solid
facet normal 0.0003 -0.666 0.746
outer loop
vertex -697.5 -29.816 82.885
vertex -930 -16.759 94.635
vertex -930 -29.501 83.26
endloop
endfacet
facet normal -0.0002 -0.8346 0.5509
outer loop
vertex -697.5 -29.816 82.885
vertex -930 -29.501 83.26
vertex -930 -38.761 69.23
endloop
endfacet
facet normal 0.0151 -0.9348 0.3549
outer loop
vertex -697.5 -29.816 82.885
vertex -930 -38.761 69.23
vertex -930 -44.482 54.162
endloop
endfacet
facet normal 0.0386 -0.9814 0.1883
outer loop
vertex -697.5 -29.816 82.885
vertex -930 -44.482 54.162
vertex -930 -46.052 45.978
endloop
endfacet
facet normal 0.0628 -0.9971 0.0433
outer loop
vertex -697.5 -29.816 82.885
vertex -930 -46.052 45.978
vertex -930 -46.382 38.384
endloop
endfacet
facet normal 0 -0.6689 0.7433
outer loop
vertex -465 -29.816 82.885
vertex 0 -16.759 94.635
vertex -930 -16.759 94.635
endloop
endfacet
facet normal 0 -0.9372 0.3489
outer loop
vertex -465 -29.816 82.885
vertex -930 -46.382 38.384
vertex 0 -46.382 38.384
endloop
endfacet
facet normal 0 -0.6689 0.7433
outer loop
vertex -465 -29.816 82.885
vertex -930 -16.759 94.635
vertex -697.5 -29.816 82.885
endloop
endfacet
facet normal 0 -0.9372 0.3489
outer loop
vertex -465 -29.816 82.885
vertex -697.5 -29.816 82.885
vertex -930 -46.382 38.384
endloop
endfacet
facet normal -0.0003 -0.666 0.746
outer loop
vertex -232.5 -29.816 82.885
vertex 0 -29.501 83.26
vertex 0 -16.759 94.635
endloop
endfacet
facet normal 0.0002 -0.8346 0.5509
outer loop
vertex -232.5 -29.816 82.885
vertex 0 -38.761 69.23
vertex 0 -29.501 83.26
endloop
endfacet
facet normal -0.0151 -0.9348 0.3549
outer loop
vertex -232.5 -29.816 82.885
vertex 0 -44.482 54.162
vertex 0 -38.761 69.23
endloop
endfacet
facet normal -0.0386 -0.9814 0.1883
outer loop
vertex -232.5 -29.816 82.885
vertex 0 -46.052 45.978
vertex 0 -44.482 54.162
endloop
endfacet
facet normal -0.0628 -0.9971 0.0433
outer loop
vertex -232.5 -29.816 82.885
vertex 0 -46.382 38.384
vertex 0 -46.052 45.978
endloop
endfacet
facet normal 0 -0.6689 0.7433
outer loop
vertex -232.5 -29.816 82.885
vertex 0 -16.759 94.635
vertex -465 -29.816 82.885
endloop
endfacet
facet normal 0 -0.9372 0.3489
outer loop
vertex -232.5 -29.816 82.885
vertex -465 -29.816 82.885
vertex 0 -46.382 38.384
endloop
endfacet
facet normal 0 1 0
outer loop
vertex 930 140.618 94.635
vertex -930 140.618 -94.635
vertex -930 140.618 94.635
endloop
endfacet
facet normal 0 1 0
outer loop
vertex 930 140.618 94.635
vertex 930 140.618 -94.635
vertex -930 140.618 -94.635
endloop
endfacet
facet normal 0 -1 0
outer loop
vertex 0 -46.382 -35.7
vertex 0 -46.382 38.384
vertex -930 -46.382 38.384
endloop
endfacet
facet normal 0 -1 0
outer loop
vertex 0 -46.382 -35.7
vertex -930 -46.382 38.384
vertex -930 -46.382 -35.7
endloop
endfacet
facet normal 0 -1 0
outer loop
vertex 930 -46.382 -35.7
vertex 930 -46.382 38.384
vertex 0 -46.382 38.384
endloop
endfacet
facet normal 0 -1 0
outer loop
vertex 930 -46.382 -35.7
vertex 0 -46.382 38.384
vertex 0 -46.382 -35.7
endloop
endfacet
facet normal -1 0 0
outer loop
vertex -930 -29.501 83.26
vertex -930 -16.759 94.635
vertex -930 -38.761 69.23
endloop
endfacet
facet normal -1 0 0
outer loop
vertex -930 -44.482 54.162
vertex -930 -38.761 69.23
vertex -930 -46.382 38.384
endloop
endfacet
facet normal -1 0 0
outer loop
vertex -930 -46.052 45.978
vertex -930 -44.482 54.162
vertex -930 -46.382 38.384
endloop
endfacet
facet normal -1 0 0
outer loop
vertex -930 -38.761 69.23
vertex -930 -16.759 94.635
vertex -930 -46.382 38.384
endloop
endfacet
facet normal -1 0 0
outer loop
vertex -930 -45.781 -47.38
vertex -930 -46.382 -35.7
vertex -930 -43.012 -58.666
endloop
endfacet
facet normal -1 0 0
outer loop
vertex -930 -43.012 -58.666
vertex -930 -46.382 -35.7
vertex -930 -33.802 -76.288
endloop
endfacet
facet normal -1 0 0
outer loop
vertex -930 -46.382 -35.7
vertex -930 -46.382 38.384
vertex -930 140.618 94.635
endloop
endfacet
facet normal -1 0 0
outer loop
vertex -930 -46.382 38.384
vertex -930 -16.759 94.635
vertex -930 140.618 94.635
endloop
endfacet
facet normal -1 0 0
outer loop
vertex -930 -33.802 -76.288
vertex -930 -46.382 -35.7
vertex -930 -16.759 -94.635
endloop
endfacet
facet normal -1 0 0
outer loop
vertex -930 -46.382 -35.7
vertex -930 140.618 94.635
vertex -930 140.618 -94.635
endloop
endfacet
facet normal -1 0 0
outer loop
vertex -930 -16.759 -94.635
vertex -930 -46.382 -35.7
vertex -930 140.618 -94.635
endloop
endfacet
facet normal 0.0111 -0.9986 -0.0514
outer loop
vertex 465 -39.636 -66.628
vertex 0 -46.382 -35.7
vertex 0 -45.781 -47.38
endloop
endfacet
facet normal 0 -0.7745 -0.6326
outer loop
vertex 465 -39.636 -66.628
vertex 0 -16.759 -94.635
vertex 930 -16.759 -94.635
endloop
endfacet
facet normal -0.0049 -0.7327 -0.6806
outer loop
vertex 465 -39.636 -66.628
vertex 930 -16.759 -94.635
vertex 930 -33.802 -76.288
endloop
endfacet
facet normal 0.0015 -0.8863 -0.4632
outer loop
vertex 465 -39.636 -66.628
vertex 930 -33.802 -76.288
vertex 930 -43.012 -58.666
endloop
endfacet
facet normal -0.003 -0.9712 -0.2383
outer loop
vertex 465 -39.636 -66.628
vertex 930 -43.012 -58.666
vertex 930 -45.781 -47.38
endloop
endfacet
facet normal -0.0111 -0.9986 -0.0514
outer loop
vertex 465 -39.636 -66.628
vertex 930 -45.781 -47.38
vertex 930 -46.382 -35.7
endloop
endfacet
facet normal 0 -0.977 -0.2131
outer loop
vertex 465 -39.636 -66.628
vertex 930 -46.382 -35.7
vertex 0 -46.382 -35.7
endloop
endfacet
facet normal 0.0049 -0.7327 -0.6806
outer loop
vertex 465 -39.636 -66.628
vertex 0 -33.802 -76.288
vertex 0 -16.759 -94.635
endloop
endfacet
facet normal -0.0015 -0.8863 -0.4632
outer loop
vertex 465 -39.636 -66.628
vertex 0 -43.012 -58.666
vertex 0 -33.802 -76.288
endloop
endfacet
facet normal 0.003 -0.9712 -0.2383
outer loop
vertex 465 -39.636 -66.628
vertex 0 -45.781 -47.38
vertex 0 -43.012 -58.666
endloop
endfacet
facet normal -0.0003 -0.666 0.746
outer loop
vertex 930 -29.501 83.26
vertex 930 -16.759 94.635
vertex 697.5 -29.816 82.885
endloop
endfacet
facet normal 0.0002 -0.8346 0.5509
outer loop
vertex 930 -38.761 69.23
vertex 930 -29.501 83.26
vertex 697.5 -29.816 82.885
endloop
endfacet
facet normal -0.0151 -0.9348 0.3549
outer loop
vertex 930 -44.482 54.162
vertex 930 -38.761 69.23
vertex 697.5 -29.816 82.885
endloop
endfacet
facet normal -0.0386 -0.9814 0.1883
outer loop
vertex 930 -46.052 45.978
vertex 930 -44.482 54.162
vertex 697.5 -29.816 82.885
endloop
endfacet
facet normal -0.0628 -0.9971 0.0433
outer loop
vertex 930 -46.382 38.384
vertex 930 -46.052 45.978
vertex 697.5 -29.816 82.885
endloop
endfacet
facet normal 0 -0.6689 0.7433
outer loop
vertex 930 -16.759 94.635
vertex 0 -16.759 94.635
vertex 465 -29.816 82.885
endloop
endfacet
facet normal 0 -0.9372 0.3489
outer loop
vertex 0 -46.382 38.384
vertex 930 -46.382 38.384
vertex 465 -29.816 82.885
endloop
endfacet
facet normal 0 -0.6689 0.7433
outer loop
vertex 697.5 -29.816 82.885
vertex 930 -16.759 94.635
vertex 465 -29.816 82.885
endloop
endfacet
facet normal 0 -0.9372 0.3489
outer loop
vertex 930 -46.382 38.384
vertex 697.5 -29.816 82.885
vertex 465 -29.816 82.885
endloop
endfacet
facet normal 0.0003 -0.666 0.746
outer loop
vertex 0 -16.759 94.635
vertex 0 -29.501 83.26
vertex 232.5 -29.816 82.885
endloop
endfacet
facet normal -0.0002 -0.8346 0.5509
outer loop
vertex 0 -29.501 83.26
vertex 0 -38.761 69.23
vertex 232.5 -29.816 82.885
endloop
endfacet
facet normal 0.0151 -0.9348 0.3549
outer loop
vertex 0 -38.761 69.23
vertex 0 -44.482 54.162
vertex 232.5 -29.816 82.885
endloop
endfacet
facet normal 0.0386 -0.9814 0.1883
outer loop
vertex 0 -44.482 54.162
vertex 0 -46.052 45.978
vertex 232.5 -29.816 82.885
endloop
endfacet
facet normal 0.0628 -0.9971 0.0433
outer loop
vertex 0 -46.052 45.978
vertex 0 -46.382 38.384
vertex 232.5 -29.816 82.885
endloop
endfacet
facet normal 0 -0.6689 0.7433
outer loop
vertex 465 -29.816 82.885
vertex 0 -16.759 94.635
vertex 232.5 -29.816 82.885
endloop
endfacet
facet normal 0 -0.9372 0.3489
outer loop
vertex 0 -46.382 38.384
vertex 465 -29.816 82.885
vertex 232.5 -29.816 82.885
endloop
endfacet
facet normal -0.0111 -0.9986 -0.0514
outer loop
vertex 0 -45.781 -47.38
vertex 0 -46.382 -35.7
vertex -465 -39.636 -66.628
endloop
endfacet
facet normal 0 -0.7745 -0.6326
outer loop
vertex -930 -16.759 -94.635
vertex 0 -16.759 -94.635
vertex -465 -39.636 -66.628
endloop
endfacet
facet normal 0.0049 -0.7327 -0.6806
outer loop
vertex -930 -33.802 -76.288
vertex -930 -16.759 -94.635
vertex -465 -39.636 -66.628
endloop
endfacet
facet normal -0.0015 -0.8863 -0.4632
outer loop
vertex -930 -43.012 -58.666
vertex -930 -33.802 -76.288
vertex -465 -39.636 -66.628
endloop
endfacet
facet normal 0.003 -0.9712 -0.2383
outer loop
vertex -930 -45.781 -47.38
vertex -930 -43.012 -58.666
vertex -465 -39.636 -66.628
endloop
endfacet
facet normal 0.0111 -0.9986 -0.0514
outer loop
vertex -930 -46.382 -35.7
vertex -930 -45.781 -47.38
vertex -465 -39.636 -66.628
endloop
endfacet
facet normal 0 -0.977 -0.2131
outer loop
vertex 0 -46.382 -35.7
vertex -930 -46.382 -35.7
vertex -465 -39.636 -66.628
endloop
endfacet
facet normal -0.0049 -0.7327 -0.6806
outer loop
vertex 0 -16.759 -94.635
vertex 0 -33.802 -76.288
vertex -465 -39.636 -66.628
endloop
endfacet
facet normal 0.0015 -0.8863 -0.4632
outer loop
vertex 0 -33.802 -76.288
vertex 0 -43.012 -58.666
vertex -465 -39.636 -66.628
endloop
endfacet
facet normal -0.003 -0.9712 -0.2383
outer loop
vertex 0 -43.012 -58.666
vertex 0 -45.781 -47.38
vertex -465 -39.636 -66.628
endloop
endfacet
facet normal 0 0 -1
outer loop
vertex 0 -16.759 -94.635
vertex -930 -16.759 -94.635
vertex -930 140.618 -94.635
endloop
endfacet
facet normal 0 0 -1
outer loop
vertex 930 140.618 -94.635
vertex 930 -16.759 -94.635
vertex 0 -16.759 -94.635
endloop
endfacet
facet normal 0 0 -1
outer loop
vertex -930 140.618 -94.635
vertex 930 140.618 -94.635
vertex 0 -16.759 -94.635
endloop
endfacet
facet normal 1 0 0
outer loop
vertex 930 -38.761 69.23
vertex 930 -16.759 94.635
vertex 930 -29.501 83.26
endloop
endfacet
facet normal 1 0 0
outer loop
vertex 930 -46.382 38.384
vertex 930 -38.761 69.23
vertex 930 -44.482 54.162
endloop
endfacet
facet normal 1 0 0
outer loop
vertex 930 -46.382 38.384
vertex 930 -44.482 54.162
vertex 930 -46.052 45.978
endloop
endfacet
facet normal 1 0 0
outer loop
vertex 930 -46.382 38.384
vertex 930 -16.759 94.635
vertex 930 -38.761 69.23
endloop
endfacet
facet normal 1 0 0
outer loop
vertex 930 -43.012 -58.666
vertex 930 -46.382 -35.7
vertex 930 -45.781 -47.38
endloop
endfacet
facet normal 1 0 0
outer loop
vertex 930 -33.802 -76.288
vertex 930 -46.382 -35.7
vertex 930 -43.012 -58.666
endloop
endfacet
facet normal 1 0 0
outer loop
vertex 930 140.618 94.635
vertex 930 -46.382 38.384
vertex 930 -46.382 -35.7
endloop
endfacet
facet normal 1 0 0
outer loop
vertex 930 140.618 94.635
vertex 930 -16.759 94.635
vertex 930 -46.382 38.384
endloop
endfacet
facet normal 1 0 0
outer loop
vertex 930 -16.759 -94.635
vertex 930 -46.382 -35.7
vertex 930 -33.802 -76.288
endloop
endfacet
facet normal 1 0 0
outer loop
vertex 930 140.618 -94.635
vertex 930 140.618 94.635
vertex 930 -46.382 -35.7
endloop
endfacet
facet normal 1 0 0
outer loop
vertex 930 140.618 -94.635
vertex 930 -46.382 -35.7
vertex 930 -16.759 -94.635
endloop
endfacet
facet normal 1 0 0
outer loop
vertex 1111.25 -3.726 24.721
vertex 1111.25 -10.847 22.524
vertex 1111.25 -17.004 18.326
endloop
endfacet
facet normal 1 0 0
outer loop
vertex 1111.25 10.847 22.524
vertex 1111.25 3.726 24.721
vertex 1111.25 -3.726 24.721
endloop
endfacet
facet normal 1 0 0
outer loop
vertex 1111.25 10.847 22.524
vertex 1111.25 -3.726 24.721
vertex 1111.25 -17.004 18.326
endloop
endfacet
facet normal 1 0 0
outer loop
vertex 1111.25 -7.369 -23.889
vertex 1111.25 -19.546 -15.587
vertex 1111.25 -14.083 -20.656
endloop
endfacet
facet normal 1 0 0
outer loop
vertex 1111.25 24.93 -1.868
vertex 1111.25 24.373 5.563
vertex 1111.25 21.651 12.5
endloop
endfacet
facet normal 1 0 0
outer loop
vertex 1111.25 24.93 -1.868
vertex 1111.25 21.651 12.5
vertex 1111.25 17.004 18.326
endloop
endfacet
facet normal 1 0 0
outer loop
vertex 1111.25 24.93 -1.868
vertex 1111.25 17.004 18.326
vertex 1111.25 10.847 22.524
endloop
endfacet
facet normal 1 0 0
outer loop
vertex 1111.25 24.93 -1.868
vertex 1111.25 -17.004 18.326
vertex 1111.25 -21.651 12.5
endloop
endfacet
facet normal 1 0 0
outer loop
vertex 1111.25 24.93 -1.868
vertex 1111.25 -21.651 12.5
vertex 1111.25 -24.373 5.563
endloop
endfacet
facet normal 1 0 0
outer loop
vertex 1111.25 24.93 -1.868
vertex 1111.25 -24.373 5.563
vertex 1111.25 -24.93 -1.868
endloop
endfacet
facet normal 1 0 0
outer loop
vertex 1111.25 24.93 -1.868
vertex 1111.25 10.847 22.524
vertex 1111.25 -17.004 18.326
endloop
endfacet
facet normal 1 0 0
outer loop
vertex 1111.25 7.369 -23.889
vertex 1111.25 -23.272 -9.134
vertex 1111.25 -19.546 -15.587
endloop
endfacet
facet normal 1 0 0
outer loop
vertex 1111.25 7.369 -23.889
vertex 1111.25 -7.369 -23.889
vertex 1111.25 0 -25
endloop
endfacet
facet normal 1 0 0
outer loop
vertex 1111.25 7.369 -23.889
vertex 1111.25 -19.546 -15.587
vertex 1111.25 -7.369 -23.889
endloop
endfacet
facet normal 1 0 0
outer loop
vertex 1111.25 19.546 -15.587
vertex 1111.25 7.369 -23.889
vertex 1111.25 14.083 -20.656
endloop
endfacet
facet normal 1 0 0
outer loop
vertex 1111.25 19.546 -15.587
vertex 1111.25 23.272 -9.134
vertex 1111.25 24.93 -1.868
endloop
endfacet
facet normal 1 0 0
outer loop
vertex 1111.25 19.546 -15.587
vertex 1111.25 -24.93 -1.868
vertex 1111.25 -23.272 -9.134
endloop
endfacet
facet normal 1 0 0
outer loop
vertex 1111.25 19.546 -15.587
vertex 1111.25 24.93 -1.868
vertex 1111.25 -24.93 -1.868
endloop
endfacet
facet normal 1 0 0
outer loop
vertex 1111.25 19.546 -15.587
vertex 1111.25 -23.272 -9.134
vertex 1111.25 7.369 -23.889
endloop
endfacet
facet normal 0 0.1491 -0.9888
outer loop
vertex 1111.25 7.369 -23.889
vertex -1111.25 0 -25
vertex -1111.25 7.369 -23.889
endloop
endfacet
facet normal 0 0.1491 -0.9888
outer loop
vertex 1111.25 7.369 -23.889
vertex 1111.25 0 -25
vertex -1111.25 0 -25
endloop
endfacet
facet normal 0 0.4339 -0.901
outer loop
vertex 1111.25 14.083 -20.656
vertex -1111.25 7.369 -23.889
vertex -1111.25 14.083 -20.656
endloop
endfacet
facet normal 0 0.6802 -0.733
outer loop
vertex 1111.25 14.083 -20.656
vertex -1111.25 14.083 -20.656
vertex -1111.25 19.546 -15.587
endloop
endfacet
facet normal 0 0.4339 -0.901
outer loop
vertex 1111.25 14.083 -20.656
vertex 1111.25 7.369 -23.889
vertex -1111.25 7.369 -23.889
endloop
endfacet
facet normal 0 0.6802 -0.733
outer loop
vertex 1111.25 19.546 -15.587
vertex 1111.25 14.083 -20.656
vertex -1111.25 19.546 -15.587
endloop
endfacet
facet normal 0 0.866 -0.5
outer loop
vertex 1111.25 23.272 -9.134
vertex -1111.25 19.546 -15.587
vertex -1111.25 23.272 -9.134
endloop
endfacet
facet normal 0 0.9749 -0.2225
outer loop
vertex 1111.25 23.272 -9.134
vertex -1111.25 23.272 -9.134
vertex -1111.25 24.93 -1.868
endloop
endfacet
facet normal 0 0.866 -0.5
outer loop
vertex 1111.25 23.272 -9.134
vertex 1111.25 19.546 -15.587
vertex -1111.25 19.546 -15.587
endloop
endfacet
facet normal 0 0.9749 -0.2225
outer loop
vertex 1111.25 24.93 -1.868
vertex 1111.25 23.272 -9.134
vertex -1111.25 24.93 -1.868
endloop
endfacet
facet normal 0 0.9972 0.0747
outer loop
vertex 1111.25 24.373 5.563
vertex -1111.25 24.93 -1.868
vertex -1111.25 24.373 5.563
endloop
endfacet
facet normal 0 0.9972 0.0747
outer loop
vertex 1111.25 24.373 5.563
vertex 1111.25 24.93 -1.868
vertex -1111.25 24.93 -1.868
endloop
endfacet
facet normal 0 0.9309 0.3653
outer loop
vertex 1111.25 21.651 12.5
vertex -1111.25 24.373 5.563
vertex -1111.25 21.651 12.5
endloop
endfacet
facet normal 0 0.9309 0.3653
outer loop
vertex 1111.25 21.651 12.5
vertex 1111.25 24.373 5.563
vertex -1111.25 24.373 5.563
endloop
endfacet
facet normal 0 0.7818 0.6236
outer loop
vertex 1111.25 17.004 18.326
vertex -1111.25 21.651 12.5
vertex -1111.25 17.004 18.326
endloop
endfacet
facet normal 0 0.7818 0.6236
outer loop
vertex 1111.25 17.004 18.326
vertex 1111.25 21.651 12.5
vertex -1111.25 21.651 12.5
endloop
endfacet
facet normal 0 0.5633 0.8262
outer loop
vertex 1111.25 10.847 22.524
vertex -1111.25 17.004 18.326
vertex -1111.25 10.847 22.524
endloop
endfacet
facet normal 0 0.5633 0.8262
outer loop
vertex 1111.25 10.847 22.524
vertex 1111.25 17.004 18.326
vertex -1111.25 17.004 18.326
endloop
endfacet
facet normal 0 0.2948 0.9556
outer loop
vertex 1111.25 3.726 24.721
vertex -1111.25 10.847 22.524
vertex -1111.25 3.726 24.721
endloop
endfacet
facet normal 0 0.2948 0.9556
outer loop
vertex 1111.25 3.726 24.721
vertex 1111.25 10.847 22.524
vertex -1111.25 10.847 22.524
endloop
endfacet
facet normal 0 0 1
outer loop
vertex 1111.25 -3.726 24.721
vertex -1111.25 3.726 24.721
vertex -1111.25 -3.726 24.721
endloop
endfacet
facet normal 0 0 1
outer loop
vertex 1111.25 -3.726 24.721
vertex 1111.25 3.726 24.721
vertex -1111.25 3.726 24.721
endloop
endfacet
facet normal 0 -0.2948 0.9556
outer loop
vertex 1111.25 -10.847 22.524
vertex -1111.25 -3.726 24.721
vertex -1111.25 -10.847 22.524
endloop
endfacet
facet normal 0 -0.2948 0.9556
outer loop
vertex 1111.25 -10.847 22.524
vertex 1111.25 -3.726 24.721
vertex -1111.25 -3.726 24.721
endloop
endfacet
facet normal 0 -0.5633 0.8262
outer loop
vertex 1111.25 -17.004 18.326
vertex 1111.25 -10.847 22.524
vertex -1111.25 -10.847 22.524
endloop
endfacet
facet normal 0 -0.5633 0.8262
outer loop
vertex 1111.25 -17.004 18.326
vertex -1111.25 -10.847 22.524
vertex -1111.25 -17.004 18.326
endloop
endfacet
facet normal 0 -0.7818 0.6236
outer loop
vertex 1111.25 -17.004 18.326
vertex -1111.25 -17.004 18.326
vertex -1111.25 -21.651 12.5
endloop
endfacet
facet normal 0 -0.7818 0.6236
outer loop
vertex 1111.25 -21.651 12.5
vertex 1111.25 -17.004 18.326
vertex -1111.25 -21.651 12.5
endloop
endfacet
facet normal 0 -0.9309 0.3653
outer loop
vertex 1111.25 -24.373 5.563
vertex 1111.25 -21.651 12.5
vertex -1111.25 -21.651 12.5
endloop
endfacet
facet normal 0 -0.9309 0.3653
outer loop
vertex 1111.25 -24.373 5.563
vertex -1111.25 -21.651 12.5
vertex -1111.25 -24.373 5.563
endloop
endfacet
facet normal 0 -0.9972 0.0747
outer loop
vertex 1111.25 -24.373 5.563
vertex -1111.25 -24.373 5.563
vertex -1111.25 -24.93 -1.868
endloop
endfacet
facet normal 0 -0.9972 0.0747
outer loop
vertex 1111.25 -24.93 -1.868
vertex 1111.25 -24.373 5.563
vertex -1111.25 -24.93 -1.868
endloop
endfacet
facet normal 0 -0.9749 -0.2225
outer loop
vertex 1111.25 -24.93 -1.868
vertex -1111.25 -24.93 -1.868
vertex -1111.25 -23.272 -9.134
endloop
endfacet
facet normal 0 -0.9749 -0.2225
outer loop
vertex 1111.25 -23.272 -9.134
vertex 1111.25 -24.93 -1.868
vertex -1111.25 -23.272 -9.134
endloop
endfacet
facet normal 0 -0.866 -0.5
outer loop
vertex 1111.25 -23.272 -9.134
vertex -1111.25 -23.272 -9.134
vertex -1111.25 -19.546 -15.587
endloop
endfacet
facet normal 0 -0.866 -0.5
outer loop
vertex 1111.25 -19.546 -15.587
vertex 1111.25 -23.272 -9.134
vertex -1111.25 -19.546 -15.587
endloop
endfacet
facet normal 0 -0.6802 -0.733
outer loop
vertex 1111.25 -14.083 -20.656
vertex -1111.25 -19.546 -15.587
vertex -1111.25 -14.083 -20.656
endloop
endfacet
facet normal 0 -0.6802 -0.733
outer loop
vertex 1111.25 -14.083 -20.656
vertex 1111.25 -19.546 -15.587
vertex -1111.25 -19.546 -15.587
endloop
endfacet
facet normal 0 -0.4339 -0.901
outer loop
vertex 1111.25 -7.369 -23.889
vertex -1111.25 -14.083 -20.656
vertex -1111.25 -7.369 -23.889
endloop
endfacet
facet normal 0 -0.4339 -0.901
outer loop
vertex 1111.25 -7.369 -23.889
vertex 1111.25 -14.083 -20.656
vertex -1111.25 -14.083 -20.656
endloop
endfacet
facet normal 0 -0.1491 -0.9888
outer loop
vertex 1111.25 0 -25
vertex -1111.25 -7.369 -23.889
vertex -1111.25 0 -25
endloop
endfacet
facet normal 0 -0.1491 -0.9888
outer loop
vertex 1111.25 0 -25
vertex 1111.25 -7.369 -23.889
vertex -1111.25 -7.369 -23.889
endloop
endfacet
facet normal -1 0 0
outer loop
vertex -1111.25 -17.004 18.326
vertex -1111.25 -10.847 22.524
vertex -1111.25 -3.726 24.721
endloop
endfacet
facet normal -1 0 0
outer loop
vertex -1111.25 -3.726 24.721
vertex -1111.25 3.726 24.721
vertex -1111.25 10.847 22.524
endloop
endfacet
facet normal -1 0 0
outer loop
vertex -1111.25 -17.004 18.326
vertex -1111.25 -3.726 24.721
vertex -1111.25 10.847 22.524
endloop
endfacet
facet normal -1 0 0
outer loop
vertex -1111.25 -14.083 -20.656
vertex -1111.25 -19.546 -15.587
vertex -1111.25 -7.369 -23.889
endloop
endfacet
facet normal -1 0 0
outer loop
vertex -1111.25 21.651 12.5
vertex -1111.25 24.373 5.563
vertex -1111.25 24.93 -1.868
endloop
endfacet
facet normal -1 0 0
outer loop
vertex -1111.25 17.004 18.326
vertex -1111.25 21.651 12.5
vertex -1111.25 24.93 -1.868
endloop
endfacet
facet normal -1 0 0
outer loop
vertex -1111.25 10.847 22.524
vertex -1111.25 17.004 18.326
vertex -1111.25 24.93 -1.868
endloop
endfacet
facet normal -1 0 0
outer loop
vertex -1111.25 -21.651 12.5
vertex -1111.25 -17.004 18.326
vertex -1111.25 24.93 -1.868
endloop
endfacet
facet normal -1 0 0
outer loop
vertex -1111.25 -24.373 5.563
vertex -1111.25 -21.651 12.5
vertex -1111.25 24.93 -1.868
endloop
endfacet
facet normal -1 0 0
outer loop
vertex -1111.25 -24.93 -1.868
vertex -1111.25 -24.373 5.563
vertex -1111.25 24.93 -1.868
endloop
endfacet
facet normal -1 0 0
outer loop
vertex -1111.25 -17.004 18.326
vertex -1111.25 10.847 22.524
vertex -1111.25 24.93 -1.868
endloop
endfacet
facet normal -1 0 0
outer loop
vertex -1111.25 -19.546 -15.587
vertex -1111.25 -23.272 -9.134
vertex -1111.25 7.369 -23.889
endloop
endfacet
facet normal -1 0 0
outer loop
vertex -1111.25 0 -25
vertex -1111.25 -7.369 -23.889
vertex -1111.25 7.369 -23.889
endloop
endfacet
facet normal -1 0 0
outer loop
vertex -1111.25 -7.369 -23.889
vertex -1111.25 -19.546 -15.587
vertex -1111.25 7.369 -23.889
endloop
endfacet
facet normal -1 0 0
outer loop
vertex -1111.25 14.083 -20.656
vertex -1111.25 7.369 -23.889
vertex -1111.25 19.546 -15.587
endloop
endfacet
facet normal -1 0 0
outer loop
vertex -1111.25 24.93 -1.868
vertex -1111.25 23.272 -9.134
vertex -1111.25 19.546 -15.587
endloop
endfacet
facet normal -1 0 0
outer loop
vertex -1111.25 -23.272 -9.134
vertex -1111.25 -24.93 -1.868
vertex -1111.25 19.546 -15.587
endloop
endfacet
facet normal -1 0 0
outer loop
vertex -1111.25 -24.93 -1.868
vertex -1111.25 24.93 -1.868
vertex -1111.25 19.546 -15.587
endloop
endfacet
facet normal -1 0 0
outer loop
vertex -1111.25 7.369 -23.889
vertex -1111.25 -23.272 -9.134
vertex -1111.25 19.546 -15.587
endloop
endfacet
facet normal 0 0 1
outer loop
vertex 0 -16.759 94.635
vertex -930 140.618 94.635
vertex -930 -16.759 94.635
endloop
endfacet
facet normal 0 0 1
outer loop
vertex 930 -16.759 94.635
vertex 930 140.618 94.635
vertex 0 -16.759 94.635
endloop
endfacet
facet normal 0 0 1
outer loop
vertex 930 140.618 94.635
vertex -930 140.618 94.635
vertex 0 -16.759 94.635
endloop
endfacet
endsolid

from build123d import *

# Parameters (mm, degrees)
BOSS_EXTRUDE1_DEPTH = 930.000000042
SKETCH2_R           = 25
BOSS_EXTRUDE2_DEPTH = 1111.25


with BuildPart() as part:
    # Sketch11 → Boss-Extrude1 (new, symmetric)
    with BuildSketch(Plane(origin=(0, 0, 0), x_dir=(0, 0, -1), z_dir=(1, 0, 0))):
        with BuildLine():
            Line((-94.634542526, 140.618265246), (-94.634542526, -16.759321043))
            add(Edge.make_bspline(
                [(-94.634542526, -16.759321043), (-84.796398937, -31.685202318), (-69.208991885, -41.543873053), (-51.629015176, -46.966208653), (-38.383860366, -46.381734754)],
                knots=[0, 0, 0, 0, 0, 1, 1, 1, 1, 1], degree=4))
            Line((-38.383860366, -46.381734754), (35.700403673, -46.381734754))
            add(Edge.make_bspline(
                [(94.634542526, -16.759321059), (68.088856738, -47.700845058), (35.700403673, -46.381734754)],
                knots=[0, 0, 0, 0.879181674, 0.879181674, 0.879181674], degree=2))
            Line((94.634542526, -16.759321059), (94.634542526, 140.618265246))
            Line((94.634542526, 140.618265246), (-94.634542526, 140.618265246))
        make_face()
    extrude(amount=BOSS_EXTRUDE1_DEPTH, both=True)


with BuildPart() as body_2:
    # Sketch2 → Boss-Extrude2 (new, symmetric)
    with BuildSketch(Plane(origin=(0, 0, 0), x_dir=(0, 0, -1), z_dir=(1, 0, 0))):
        Circle(SKETCH2_R)
    extrude(amount=BOSS_EXTRUDE2_DEPTH, both=True)


solid = Compound([part.part, body_2.part])
